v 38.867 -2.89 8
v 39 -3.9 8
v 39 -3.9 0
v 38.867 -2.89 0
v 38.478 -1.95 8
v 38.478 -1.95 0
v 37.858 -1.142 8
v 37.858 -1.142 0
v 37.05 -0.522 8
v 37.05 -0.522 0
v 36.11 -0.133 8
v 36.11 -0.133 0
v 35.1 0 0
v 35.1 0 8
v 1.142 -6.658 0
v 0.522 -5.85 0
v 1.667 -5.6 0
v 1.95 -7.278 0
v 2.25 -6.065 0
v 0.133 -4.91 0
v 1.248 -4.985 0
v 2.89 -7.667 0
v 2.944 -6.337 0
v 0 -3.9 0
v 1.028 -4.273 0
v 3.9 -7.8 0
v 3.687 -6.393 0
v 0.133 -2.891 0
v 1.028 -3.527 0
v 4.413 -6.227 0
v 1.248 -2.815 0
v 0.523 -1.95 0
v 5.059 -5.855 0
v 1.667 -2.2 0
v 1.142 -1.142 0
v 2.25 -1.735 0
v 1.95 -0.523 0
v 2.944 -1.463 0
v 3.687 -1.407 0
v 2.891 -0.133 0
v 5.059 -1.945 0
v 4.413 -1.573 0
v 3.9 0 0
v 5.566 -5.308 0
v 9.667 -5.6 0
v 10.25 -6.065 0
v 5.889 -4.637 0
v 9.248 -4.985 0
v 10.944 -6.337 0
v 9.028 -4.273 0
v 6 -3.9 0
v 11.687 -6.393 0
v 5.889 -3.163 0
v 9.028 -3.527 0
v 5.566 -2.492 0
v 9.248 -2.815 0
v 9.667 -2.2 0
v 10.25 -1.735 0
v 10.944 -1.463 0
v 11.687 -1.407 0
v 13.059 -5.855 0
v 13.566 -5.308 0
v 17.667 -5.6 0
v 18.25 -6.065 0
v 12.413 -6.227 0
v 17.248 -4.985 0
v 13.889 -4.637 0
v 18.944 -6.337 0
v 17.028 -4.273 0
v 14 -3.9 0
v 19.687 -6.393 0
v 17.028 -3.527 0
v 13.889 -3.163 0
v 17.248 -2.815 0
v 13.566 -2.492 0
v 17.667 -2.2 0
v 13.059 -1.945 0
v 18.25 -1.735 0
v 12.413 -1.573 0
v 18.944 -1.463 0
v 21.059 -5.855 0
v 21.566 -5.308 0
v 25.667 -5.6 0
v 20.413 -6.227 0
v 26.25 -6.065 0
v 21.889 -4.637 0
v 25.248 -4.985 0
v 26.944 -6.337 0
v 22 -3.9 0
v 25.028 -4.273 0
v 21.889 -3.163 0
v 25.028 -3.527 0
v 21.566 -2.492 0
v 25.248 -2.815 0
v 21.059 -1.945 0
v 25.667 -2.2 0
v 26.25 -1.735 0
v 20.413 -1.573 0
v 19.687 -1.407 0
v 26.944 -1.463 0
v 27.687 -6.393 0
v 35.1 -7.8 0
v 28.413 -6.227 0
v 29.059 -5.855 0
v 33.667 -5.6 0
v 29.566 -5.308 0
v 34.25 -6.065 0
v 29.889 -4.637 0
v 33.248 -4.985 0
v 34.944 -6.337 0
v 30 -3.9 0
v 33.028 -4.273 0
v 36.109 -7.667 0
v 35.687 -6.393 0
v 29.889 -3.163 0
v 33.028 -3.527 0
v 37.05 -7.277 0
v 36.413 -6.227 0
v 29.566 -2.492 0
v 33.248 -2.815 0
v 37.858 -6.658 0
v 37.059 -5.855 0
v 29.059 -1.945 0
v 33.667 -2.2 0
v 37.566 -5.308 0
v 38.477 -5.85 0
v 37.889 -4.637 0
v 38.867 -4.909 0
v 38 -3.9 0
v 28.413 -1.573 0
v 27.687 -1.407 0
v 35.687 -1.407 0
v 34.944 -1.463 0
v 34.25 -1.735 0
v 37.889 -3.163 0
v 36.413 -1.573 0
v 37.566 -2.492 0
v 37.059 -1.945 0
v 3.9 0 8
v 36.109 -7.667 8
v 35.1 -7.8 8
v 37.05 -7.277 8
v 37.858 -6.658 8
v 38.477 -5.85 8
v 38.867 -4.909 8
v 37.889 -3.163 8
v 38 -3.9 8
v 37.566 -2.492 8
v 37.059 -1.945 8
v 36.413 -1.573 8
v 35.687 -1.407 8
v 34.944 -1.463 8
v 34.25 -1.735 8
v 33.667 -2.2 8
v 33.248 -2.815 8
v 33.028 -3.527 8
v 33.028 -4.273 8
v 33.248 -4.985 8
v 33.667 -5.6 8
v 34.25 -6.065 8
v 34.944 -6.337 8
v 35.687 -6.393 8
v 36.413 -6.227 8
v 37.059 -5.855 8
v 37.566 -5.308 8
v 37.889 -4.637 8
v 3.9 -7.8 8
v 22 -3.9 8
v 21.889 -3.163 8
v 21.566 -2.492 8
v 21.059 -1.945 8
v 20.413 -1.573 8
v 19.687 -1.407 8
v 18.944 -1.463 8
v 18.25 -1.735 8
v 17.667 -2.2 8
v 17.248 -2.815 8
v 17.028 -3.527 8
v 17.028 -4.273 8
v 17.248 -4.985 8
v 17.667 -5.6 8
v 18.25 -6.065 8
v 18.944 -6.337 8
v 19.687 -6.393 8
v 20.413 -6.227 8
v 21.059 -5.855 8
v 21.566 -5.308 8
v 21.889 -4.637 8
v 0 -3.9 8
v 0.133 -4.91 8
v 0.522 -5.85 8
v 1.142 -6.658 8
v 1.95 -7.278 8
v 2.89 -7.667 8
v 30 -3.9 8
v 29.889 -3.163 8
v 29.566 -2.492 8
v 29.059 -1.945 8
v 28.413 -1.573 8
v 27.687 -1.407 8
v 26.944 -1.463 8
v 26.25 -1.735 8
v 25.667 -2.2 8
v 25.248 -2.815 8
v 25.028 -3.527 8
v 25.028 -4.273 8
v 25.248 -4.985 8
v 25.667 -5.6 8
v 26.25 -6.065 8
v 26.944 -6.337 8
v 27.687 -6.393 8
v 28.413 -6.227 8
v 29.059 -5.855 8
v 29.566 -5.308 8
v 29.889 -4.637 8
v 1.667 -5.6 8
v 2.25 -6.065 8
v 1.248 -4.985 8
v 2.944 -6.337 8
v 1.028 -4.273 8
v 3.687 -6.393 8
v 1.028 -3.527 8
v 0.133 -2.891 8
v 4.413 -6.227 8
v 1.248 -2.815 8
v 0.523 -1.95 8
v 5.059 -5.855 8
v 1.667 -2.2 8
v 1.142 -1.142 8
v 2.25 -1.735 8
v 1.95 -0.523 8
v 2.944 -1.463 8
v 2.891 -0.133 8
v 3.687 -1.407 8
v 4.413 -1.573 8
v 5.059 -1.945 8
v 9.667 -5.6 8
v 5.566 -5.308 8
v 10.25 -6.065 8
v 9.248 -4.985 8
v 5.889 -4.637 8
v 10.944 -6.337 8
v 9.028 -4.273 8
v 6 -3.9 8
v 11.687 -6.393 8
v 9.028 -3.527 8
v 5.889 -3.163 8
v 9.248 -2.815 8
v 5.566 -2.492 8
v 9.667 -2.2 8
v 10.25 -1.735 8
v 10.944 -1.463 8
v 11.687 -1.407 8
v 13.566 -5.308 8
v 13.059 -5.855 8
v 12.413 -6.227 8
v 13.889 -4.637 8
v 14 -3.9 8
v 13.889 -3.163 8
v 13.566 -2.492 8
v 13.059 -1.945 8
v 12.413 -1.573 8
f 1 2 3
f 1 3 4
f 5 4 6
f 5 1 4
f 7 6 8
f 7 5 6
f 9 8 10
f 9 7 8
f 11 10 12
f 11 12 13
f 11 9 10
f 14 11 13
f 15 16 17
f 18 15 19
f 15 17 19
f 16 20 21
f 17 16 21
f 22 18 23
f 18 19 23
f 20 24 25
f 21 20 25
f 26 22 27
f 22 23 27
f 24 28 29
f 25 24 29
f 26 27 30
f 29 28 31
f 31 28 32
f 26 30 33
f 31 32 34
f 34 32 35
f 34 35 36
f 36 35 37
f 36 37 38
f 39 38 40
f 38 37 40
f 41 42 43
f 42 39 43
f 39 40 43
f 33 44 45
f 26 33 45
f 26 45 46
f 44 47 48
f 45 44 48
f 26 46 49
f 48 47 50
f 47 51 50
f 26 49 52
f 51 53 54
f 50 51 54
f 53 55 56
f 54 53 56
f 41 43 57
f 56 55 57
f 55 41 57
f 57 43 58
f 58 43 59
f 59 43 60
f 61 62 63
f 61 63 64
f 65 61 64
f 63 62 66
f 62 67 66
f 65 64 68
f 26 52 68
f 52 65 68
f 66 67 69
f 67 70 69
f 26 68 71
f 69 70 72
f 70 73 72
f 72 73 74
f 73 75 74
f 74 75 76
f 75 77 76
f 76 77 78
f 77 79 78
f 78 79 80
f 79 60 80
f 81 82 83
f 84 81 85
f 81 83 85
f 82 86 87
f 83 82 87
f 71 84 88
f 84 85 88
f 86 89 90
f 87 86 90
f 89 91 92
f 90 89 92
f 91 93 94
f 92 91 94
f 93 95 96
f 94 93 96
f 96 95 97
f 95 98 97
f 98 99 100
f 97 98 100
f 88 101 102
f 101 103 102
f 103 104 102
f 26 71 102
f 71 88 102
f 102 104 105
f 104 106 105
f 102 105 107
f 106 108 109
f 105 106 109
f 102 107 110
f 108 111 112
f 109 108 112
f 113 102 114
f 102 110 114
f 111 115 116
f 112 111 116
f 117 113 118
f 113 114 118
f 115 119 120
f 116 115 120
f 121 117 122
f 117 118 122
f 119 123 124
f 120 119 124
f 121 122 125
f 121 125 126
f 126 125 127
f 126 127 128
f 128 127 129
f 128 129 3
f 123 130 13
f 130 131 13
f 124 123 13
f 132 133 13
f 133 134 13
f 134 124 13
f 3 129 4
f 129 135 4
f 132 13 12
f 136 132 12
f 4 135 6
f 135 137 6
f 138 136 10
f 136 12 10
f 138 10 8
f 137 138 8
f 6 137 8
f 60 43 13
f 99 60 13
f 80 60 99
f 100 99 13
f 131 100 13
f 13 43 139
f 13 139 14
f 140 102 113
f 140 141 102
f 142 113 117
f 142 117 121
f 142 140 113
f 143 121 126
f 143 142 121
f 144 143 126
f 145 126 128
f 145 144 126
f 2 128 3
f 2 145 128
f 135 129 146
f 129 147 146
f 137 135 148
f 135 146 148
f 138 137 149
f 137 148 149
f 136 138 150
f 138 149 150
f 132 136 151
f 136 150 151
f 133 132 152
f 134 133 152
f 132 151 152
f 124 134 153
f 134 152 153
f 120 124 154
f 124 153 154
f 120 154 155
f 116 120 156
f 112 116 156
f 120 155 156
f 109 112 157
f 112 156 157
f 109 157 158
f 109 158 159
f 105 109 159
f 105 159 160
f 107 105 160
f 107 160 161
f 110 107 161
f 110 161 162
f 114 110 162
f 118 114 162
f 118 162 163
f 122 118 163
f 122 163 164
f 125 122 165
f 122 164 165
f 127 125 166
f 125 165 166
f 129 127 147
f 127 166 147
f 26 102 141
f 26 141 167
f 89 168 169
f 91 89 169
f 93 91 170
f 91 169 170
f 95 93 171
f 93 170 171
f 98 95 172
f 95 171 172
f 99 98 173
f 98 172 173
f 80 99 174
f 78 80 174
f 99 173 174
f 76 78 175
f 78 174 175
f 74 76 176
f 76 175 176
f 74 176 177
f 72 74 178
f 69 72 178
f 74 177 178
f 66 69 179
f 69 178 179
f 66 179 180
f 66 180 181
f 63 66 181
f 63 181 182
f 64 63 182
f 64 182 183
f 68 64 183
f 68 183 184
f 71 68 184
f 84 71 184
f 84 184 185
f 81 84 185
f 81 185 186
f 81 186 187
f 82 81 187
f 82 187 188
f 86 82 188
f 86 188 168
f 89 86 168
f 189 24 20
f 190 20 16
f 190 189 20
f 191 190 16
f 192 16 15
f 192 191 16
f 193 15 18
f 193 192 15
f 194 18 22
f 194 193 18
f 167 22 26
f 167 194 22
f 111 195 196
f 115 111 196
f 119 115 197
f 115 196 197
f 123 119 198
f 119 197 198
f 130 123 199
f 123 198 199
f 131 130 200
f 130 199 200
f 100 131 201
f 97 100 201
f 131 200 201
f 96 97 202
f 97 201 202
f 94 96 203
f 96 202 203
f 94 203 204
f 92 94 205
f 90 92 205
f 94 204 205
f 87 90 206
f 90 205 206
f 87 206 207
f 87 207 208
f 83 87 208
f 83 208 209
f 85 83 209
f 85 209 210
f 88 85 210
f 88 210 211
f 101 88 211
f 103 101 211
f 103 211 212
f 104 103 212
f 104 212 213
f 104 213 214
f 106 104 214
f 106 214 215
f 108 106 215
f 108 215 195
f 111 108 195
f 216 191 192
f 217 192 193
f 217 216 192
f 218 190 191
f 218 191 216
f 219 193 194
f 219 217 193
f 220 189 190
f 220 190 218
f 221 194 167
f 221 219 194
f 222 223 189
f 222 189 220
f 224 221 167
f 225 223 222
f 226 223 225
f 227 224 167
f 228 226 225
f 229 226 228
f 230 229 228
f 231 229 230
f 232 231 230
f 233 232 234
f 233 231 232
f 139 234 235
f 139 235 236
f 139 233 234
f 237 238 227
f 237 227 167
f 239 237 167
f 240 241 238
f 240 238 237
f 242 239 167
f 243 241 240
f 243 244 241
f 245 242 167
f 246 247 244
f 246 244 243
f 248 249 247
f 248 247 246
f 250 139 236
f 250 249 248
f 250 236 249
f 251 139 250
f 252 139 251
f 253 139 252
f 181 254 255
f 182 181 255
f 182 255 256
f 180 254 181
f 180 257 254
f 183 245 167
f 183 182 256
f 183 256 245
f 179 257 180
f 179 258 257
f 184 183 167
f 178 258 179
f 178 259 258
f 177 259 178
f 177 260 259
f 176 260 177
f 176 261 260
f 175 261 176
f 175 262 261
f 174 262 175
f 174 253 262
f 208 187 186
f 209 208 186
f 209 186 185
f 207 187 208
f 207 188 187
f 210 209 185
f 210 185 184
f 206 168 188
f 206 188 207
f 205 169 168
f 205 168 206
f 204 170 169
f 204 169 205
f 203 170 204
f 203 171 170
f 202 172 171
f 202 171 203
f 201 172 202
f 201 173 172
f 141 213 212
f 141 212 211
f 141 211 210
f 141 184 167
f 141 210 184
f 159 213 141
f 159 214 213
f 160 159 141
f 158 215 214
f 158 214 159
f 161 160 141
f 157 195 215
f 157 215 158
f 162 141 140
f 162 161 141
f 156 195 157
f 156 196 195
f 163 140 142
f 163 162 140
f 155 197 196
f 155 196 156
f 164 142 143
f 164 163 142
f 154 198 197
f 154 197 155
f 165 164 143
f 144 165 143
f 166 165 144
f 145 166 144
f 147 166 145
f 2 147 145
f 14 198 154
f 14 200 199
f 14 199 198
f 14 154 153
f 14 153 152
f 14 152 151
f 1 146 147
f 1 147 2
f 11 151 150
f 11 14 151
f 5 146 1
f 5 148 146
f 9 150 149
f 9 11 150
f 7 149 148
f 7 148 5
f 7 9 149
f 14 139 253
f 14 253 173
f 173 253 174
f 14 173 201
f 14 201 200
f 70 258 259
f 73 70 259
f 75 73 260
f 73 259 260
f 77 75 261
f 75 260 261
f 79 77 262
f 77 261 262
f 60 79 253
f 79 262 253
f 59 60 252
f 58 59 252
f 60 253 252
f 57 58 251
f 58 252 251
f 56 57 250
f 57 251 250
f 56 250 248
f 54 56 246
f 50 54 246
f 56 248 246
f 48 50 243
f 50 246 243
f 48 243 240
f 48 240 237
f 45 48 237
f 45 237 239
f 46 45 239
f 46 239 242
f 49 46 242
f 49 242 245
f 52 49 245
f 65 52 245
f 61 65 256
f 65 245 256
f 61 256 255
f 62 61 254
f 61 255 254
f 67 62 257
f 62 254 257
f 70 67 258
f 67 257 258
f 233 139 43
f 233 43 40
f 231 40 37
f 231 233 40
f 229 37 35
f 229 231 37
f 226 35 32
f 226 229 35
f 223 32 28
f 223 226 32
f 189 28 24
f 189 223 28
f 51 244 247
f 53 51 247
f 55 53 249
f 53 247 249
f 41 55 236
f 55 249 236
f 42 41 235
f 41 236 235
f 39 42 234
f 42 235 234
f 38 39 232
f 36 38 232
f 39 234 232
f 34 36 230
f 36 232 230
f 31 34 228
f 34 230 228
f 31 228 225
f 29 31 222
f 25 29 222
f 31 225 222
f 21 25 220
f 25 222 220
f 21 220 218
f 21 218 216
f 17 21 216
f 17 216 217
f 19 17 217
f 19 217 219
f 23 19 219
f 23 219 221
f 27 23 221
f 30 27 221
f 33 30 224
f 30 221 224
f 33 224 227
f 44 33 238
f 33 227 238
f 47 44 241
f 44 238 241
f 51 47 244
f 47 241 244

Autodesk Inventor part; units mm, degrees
ref_plane "YZ Plane" through (0, 0, 0) normal (1, 0, 0) x (0, 1, 0)
ref_plane "XZ Plane" through (0, 0, 0) normal (0, 1, 0) x (-1, 0, 0)
ref_plane "XY Plane" through (0, 0, 0) normal (0, 0, 1) x (1, 0, 0)
sketch "Sketch1" plane through (0, 0, 0) normal (0, 0, 1) x (1, 0, 0)
  line L0 (0, 0) -> (39, 0)
  line L1 (39, 0) -> (39, -7.8)
  line L2 (39, -7.8) -> (0, -7.8)
  line L3 (0, -7.8) -> (0, 0)
  dimension "d0" = 39
  dimension "d1" = 7.8
extrude "Extrusion1" add sketch "Sketch1" along normal blind 8
fillet "Fillet1" radius 3.9 1 edges at (0, 0, 4)
fillet "Fillet2" radius 3.9 1 edges at (0, -7.8, 4)
fillet "Fillet3" radius 3.9 1 edges at (39, -7.8, 4)
fillet "Fillet4" radius 3.9 1 edges at (39, 0, 4)
sketch "Sketch2" plane through (0, 0, 8) normal (0, 0, 1) x (1, 0, 0)
  line L0 (35.1, 0) -> (3.9, 0) projected
  arc A0 (35.1, -7.8) -> (35.1, 0) centre (35.1, -3.9) ccw projected
  line L1 (0, -3.9) -> (39, -3.9)
  circle A1 centre (19.5, -3.9) radius 2.5
  circle A2 centre (27.5, -3.9) radius 2.5
  circle A3 centre (35.5, -3.9) radius 2.5
  circle A4 centre (11.5, -3.9) radius 2.5
  circle A5 centre (3.5, -3.9) radius 2.5
  point P0 (0, 0)
  dimension "d16" = 39
  dimension "d17" = 5
  dimension "d18" = 5
  dimension "d19" = 5
  dimension "d20" = 5
  dimension "d21" = 5
  dimension "d24" = 3
  dimension "d25" = 3
  dimension "d27" = 3
  dimension "d28" = 3
extrude "Extrusion2" cut sketch "Sketch2" against normal blind 8
properties part number "Transmission_Holder_5_Place_Holder"
